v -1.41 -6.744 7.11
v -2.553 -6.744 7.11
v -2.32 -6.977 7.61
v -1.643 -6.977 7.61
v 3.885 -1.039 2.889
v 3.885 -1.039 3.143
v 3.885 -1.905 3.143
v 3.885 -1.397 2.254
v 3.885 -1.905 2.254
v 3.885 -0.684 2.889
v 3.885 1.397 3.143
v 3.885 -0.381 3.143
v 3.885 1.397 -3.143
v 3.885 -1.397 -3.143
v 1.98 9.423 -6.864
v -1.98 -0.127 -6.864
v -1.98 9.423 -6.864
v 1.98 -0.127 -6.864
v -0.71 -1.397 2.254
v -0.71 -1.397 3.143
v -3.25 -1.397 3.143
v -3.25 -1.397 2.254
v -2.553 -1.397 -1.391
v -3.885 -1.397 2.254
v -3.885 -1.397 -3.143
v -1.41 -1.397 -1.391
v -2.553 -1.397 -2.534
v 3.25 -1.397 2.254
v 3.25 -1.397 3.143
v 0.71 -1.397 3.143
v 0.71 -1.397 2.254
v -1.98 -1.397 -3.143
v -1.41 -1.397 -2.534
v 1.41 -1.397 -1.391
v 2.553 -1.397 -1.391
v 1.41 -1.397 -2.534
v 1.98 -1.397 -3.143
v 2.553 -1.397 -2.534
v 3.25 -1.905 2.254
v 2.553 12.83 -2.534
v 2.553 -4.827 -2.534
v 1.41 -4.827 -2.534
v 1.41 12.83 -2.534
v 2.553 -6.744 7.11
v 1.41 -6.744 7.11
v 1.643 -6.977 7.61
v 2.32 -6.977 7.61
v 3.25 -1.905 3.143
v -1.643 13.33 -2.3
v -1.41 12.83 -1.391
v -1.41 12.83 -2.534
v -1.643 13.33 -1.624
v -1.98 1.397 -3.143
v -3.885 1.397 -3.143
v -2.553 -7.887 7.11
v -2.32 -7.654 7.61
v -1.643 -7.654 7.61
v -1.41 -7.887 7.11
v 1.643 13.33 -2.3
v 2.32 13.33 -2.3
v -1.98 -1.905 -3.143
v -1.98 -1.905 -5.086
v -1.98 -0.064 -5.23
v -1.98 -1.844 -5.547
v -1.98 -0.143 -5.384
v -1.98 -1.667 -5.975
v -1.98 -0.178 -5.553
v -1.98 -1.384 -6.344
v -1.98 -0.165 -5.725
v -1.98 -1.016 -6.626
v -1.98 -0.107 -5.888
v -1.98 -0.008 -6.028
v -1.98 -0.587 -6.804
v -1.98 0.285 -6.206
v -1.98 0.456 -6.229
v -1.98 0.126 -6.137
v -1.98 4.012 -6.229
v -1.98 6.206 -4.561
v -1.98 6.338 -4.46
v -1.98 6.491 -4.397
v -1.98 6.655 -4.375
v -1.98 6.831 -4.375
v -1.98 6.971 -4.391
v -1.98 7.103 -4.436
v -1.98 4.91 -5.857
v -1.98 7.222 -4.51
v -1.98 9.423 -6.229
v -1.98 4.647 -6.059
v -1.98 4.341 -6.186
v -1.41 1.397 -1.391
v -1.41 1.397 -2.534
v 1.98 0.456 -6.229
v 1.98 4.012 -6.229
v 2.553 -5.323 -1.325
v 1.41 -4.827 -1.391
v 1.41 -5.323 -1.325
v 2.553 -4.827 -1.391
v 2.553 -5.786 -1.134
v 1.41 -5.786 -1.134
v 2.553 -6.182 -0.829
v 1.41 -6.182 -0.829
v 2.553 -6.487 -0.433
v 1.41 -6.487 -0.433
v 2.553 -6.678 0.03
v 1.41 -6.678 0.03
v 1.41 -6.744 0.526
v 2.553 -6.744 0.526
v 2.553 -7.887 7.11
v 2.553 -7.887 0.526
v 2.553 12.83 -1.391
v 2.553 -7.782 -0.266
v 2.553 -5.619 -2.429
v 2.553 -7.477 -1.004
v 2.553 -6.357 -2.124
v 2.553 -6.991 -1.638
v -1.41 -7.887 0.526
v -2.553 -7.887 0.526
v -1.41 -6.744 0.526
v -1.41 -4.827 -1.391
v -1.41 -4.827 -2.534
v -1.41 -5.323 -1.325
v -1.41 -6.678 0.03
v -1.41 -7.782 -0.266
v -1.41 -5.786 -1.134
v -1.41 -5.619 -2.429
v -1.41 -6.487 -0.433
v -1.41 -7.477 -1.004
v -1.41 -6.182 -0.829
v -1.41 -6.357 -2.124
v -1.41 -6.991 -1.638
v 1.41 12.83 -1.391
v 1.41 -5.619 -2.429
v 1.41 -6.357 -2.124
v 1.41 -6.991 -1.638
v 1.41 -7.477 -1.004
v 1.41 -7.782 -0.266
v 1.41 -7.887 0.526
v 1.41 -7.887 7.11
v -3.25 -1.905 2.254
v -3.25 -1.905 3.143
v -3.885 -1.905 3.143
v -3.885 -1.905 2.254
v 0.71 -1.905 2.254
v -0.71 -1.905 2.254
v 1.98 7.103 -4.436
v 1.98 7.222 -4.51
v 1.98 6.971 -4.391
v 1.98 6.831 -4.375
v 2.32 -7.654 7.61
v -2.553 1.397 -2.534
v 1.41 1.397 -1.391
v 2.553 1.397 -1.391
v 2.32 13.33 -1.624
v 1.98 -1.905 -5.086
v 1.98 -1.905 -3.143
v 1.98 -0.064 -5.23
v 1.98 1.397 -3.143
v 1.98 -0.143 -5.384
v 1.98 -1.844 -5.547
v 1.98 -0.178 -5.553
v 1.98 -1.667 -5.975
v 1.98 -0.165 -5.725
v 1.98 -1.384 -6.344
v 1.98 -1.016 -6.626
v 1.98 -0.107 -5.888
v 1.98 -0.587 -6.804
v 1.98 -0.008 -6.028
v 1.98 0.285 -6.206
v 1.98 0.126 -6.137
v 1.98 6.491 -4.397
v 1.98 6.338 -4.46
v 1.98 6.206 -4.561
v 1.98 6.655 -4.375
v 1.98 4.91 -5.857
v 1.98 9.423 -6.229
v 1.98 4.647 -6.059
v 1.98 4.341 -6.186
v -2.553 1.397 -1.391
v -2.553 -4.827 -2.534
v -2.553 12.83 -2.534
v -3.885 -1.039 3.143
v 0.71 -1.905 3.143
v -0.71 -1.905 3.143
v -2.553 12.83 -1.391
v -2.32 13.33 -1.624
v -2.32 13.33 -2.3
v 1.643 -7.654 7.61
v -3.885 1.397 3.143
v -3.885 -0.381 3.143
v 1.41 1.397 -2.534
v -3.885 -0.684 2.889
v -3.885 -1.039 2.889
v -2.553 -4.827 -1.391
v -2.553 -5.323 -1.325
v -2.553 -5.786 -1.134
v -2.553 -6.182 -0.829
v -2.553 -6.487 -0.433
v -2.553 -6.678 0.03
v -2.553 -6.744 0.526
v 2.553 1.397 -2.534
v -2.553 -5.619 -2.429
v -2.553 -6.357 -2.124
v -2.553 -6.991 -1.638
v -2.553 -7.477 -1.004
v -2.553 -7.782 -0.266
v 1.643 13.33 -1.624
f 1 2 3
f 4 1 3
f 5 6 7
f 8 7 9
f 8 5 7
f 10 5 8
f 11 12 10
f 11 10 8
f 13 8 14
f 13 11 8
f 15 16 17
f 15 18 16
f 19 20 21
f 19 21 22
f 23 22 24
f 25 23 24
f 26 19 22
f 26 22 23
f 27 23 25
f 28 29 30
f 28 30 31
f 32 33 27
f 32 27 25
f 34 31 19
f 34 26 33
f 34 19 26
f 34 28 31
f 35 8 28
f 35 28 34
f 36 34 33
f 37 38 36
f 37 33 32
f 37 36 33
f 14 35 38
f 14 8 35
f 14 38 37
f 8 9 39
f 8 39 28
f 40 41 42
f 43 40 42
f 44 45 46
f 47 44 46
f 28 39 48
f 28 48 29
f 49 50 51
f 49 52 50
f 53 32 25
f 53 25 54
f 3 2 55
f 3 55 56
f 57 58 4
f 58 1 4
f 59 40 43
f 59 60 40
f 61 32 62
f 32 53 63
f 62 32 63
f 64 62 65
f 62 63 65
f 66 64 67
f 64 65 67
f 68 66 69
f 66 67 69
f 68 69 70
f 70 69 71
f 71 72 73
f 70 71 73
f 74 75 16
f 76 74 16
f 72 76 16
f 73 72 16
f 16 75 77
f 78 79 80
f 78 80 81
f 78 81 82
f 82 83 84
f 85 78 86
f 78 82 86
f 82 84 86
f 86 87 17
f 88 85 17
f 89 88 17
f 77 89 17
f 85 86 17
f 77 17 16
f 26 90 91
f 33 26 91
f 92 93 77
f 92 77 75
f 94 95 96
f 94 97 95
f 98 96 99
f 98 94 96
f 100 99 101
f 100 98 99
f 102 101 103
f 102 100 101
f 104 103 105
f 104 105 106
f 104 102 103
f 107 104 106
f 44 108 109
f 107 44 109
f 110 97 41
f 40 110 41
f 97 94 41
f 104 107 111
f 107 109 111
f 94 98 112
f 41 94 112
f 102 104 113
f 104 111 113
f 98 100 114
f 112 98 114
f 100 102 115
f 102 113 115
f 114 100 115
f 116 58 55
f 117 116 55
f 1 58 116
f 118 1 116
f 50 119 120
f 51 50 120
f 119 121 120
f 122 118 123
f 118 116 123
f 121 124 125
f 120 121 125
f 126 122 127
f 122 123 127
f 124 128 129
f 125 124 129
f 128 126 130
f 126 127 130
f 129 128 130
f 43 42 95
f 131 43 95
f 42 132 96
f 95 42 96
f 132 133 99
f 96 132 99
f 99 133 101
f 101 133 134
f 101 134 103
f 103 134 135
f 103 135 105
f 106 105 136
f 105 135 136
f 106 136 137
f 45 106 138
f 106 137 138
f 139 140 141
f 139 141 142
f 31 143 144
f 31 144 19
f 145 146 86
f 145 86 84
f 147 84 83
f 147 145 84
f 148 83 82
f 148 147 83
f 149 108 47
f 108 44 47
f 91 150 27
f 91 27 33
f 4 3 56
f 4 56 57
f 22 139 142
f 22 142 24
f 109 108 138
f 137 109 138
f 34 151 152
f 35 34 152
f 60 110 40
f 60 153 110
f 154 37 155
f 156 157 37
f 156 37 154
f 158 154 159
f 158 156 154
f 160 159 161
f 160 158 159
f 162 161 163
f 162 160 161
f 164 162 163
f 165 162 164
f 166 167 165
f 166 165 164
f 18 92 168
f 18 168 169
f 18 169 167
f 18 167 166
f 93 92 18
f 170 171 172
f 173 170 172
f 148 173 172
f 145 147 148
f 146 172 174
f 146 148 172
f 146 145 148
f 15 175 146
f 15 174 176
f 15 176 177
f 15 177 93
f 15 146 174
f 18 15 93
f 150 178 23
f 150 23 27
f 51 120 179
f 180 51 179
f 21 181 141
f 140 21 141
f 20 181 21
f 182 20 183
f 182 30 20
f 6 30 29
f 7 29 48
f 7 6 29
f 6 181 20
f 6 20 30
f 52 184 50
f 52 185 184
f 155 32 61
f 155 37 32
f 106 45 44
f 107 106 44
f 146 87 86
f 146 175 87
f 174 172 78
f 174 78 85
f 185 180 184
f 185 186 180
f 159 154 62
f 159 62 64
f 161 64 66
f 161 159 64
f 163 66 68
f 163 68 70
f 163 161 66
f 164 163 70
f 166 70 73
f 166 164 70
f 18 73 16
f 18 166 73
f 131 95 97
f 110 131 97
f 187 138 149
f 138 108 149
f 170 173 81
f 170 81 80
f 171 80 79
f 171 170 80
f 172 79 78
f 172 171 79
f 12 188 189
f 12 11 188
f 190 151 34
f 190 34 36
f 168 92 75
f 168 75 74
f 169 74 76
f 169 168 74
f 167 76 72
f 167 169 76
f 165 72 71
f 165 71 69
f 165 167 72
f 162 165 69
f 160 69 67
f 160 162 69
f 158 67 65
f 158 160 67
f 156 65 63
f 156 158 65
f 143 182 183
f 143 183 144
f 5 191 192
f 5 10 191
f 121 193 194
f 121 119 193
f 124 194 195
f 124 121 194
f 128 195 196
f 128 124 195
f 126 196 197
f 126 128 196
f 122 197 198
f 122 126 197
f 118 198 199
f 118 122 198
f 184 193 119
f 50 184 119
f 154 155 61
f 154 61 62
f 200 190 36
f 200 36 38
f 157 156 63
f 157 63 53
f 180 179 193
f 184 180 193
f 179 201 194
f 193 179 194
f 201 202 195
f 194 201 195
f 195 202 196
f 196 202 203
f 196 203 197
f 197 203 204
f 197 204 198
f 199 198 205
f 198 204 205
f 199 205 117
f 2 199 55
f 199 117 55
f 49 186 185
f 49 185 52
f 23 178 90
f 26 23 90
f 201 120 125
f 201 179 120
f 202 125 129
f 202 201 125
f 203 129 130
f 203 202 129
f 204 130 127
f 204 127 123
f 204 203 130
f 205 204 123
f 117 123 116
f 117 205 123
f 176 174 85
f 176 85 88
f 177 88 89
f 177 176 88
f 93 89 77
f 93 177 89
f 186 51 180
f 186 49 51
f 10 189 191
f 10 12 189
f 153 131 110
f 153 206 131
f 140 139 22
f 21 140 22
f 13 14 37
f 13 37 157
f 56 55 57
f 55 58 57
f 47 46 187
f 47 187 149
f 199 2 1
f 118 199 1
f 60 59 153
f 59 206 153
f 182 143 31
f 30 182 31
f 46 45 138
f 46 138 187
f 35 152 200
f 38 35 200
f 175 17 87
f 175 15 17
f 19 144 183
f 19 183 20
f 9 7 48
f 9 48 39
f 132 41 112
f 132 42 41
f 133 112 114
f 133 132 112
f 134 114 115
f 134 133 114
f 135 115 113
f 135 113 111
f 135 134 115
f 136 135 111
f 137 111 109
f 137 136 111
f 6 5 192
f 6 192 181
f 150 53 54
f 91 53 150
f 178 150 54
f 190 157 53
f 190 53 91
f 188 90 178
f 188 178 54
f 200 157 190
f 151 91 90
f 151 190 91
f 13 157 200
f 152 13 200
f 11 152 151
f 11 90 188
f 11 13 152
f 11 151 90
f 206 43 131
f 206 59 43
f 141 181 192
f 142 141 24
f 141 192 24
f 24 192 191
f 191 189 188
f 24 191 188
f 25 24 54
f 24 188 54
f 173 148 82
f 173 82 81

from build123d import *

# Parameters (mm, degrees)
BOSS_EXTRUDE14_DEPTH           = 3.885
BOSS_EXTRUDE14_DEPTH_BACK      = 3.885
BOSS_EXTRUDE15_DEPTH           = 1.98
BOSS_EXTRUDE15_DEPTH_BACK      = 1.98
SKETCH19_W                     = 2.54
SKETCH19_H                     = 0.508
CUT_EXTRUDE4_DEPTH             = 14.676350336
SKETCH20_W                     = 1.143
SKETCH20_H                     = 1.143
CUT_EXTRUDE5_DEPTH             = 17.713250759
SKETCH20_2_W                   = 1.143
SKETCH20_2_H                   = 1.143
SKETCH23_W                     = 1.143
SKETCH23_H                     = 1.143
BOSS_EXTRUDE16_DEPTH           = 0.5
BOSS_EXTRUDE16_DRAFT           = 25
BOSS_EXTRUDE16_PROFILE_2_DEPTH = 0.5
BOSS_EXTRUDE16_PROFILE_2_DRAFT = 25
SKETCH24_W                     = 1.143
SKETCH24_H                     = 1.143
BOSS_EXTRUDE17_DEPTH           = 0.5
BOSS_EXTRUDE17_DRAFT           = 25
BOSS_EXTRUDE17_PROFILE_2_DEPTH = 0.5
BOSS_EXTRUDE17_PROFILE_2_DRAFT = 25


with BuildPart() as part:
    # Sketch17 → Boss-Extrude14 (new, two sides: drawn at the far end of the back side and taken through both)
    with BuildSketch(Plane(origin=(0, 0, 0), x_dir=(0, 0, -1), z_dir=(1, 0, 0)).offset(-BOSS_EXTRUDE14_DEPTH_BACK)):
        Polygon((-2.88925001, -0.683705401), (-2.88925001, -1.039305413), (-3.14325, -1.039305413), (-3.14325, -1.905), (-2.25425, -1.905), (-2.25425, -1.397), (3.14325, -1.397), (3.14325, 1.397), (-3.14325, 1.397), (-3.14325, -0.381), align=None)
    extrude(amount=BOSS_EXTRUDE14_DEPTH + BOSS_EXTRUDE14_DEPTH_BACK)

    # Sketch18 → Boss-Extrude15 (add, two sides: drawn at the far end of the back side and taken through both)
    with BuildSketch(Plane(origin=(0, 0, 0), x_dir=(0, 0, -1), z_dir=(1, 0, 0)).offset(-BOSS_EXTRUDE15_DEPTH_BACK)):
        with BuildLine():
            Line((6.22935, 9.4234), (4.509763171, 7.222429228))
            ThreePointArc((4.509763171, 7.222429228), (4.409745704, 7.038219969), (4.37515, 6.831484191))
            Line((4.37515, 6.831484191), (4.37515, 6.655190003))
            ThreePointArc((4.37515, 6.655190003), (4.423486497, 6.412186024), (4.561137194, 6.206177197))
            Line((4.561137194, 6.206177197), (5.857375612, 4.909938779))
            ThreePointArc((5.857375612, 4.909938779), (6.132677006, 4.497921126), (6.22935, 4.011913167))
            Line((6.22935, 4.011913167), (6.22935, 0.455913167))
            ThreePointArc((6.22935, 0.455913167), (5.887560369, -0.107338712), (5.230128963, -0.064248381))
            Line((5.230128963, -0.064248381), (3.14325, 1.397))
            Line((3.14325, 1.397), (3.14325, -1.905))
            Line((3.14325, -1.905), (5.08635, -1.905))
            ThreePointArc((5.08635, -1.905), (6.343585857, -1.384235857), (6.86435, -0.127))
            Line((6.86435, -0.127), (6.86435, 9.4234))
            Line((6.86435, 9.4234), (6.22935, 9.4234))
        make_face()
    extrude(amount=BOSS_EXTRUDE15_DEPTH + BOSS_EXTRUDE15_DEPTH_BACK)

    # Sketch19 → Cut-Extrude4 (cut, through all)
    with BuildSketch(Plane(origin=(0, 0, 2.25425), x_dir=(-1, 0, 0), z_dir=(0, 0, -1))):
        with Locations((-1.98, -1.651)):
            Rectangle(SKETCH19_W, SKETCH19_H)
        with Locations((1.98, -1.651)):
            Rectangle(SKETCH19_W, SKETCH19_H)
    extrude(amount=-CUT_EXTRUDE4_DEPTH, mode=Mode.SUBTRACT)

    # Sketch20 → Cut-Extrude5 (cut, through all)
    with BuildSketch(Plane(origin=(0, 12.83, 0), x_dir=(1, 0, 0), z_dir=(0, 1, 0))):
        with Locations((-1.9812, 1.96215)):
            Rectangle(SKETCH20_W, SKETCH20_H)
        with Locations((1.9812, 1.96215)):
            Rectangle(SKETCH20_W, SKETCH20_H)
    extrude(amount=-CUT_EXTRUDE5_DEPTH, mode=Mode.SUBTRACT)


with BuildPart() as body_2:
    # Sweep1: sweep along a path in Sketch21
    with BuildLine(Plane(origin=(1.98, 0, 0), x_dir=(0, 0, -1), z_dir=(1, 0, 0))) as sweep1_path:
        Line((1.96215, 12.83), (1.96215, -4.8275))
        ThreePointArc((1.96215, -4.8275), (1.23351954, -6.58656954), (-0.52555, -7.3152))
        Line((-0.52555, -7.3152), (-7.11, -7.3152))
    # Sketch20<2> → Sweep1 (sweep)
    with BuildSketch(Plane(origin=(0, 12.83, 0), x_dir=(1, 0, 0), z_dir=(0, 1, 0))):
        with Locations((-1.9812, 1.96215)):
            Rectangle(SKETCH20_2_W, SKETCH20_2_H)
        with Locations((1.9812, 1.96215)):
            Rectangle(SKETCH20_2_W, SKETCH20_2_H)
    sweep(path=sweep1_path.line)


with BuildPart() as boss_extrude16_tool:
    # Sketch23 → Boss-Extrude16 (with draft: the straight prism first)
    with BuildSketch(Plane(origin=(0, 12.83, 0), x_dir=(1, 0, 0), z_dir=(0, 1, 0))):
        with Locations((1.9812, 1.96215)):
            Rectangle(SKETCH23_W, SKETCH23_H)
    extrude(amount=BOSS_EXTRUDE16_DEPTH)
    # Boss-Extrude16: the draft: its side faces are tilted about the plane it starts from
    boss_extrude16_sides = [boss_extrude16_tool.faces().sort_by_distance(p)[0] for p in [
        (1.9812, 13.08, -1.39065),
        (2.5527, 13.08, -1.96215),
        (1.9812, 13.08, -2.53365),
        (1.4097, 13.08, -1.96215),
    ]]
    draft(boss_extrude16_sides, Plane(origin=(0, 12.83, 0), x_dir=(1, 0, 0), z_dir=(0, 1, 0)), BOSS_EXTRUDE16_DRAFT)


with BuildPart() as body_2_1:
    add(body_2.part)

    # Boss-Extrude16: add boss_extrude16_tool
    add(boss_extrude16_tool.part)


with BuildPart() as boss_extrude16_profile_2_tool:
    # Sketch23 → Boss-Extrude16 profile 2 (with draft: the straight prism first)
    with BuildSketch(Plane(origin=(0, 12.83, 0), x_dir=(1, 0, 0), z_dir=(0, 1, 0))):
        with Locations((-1.9812, 1.96215)):
            Rectangle(SKETCH23_W, SKETCH23_H)
    extrude(amount=BOSS_EXTRUDE16_PROFILE_2_DEPTH)
    # Boss-Extrude16 profile 2: the draft: its side faces are tilted about the plane it starts from
    boss_extrude16_profile_2_sides = [boss_extrude16_profile_2_tool.faces().sort_by_distance(p)[0] for p in [
        (-1.9812, 13.08, -1.39065),
        (-1.4097, 13.08, -1.96215),
        (-1.9812, 13.08, -2.53365),
        (-2.5527, 13.08, -1.96215),
    ]]
    draft(boss_extrude16_profile_2_sides, Plane(origin=(0, 12.83, 0), x_dir=(1, 0, 0), z_dir=(0, 1, 0)), BOSS_EXTRUDE16_PROFILE_2_DRAFT)


with BuildPart() as body_2_2:
    add(body_2_1.part)

    # Boss-Extrude16 profile 2: add boss_extrude16_profile_2_tool
    add(boss_extrude16_profile_2_tool.part)


with BuildPart() as boss_extrude17_tool:
    # Sketch24 → Boss-Extrude17 (with draft: the straight prism first)
    with BuildSketch(Plane.XY.offset(7.11)):
        with Locations((1.9812, -7.3152)):
            Rectangle(SKETCH24_W, SKETCH24_H)
    extrude(amount=BOSS_EXTRUDE17_DEPTH)
    # Boss-Extrude17: the draft: its side faces are tilted about the plane it starts from
    boss_extrude17_sides = [boss_extrude17_tool.faces().sort_by_distance(p)[0] for p in [
        (1.9812, -6.7437, 7.36),
        (1.4097, -7.3152, 7.36),
        (1.9812, -7.8867, 7.36),
        (2.5527, -7.3152, 7.36),
    ]]
    draft(boss_extrude17_sides, Plane.XY.offset(7.11), BOSS_EXTRUDE17_DRAFT)


with BuildPart() as body_2_3:
    add(body_2_2.part)

    # Boss-Extrude17: add boss_extrude17_tool
    add(boss_extrude17_tool.part)


with BuildPart() as boss_extrude17_profile_2_tool:
    # Sketch24 → Boss-Extrude17 profile 2 (with draft: the straight prism first)
    with BuildSketch(Plane.XY.offset(7.11)):
        with Locations((-1.9812, -7.3152)):
            Rectangle(SKETCH24_W, SKETCH24_H)
    extrude(amount=BOSS_EXTRUDE17_PROFILE_2_DEPTH)
    # Boss-Extrude17 profile 2: the draft: its side faces are tilted about the plane it starts from
    boss_extrude17_profile_2_sides = [boss_extrude17_profile_2_tool.faces().sort_by_distance(p)[0] for p in [
        (-1.9812, -6.7437, 7.36),
        (-2.5527, -7.3152, 7.36),
        (-1.9812, -7.8867, 7.36),
        (-1.4097, -7.3152, 7.36),
    ]]
    draft(boss_extrude17_profile_2_sides, Plane.XY.offset(7.11), BOSS_EXTRUDE17_PROFILE_2_DRAFT)


with BuildPart() as body_2_4:
    add(body_2_3.part)

    # Boss-Extrude17 profile 2: add boss_extrude17_profile_2_tool
    add(boss_extrude17_profile_2_tool.part)


solid = Compound([part.part, body_2_4.part])
